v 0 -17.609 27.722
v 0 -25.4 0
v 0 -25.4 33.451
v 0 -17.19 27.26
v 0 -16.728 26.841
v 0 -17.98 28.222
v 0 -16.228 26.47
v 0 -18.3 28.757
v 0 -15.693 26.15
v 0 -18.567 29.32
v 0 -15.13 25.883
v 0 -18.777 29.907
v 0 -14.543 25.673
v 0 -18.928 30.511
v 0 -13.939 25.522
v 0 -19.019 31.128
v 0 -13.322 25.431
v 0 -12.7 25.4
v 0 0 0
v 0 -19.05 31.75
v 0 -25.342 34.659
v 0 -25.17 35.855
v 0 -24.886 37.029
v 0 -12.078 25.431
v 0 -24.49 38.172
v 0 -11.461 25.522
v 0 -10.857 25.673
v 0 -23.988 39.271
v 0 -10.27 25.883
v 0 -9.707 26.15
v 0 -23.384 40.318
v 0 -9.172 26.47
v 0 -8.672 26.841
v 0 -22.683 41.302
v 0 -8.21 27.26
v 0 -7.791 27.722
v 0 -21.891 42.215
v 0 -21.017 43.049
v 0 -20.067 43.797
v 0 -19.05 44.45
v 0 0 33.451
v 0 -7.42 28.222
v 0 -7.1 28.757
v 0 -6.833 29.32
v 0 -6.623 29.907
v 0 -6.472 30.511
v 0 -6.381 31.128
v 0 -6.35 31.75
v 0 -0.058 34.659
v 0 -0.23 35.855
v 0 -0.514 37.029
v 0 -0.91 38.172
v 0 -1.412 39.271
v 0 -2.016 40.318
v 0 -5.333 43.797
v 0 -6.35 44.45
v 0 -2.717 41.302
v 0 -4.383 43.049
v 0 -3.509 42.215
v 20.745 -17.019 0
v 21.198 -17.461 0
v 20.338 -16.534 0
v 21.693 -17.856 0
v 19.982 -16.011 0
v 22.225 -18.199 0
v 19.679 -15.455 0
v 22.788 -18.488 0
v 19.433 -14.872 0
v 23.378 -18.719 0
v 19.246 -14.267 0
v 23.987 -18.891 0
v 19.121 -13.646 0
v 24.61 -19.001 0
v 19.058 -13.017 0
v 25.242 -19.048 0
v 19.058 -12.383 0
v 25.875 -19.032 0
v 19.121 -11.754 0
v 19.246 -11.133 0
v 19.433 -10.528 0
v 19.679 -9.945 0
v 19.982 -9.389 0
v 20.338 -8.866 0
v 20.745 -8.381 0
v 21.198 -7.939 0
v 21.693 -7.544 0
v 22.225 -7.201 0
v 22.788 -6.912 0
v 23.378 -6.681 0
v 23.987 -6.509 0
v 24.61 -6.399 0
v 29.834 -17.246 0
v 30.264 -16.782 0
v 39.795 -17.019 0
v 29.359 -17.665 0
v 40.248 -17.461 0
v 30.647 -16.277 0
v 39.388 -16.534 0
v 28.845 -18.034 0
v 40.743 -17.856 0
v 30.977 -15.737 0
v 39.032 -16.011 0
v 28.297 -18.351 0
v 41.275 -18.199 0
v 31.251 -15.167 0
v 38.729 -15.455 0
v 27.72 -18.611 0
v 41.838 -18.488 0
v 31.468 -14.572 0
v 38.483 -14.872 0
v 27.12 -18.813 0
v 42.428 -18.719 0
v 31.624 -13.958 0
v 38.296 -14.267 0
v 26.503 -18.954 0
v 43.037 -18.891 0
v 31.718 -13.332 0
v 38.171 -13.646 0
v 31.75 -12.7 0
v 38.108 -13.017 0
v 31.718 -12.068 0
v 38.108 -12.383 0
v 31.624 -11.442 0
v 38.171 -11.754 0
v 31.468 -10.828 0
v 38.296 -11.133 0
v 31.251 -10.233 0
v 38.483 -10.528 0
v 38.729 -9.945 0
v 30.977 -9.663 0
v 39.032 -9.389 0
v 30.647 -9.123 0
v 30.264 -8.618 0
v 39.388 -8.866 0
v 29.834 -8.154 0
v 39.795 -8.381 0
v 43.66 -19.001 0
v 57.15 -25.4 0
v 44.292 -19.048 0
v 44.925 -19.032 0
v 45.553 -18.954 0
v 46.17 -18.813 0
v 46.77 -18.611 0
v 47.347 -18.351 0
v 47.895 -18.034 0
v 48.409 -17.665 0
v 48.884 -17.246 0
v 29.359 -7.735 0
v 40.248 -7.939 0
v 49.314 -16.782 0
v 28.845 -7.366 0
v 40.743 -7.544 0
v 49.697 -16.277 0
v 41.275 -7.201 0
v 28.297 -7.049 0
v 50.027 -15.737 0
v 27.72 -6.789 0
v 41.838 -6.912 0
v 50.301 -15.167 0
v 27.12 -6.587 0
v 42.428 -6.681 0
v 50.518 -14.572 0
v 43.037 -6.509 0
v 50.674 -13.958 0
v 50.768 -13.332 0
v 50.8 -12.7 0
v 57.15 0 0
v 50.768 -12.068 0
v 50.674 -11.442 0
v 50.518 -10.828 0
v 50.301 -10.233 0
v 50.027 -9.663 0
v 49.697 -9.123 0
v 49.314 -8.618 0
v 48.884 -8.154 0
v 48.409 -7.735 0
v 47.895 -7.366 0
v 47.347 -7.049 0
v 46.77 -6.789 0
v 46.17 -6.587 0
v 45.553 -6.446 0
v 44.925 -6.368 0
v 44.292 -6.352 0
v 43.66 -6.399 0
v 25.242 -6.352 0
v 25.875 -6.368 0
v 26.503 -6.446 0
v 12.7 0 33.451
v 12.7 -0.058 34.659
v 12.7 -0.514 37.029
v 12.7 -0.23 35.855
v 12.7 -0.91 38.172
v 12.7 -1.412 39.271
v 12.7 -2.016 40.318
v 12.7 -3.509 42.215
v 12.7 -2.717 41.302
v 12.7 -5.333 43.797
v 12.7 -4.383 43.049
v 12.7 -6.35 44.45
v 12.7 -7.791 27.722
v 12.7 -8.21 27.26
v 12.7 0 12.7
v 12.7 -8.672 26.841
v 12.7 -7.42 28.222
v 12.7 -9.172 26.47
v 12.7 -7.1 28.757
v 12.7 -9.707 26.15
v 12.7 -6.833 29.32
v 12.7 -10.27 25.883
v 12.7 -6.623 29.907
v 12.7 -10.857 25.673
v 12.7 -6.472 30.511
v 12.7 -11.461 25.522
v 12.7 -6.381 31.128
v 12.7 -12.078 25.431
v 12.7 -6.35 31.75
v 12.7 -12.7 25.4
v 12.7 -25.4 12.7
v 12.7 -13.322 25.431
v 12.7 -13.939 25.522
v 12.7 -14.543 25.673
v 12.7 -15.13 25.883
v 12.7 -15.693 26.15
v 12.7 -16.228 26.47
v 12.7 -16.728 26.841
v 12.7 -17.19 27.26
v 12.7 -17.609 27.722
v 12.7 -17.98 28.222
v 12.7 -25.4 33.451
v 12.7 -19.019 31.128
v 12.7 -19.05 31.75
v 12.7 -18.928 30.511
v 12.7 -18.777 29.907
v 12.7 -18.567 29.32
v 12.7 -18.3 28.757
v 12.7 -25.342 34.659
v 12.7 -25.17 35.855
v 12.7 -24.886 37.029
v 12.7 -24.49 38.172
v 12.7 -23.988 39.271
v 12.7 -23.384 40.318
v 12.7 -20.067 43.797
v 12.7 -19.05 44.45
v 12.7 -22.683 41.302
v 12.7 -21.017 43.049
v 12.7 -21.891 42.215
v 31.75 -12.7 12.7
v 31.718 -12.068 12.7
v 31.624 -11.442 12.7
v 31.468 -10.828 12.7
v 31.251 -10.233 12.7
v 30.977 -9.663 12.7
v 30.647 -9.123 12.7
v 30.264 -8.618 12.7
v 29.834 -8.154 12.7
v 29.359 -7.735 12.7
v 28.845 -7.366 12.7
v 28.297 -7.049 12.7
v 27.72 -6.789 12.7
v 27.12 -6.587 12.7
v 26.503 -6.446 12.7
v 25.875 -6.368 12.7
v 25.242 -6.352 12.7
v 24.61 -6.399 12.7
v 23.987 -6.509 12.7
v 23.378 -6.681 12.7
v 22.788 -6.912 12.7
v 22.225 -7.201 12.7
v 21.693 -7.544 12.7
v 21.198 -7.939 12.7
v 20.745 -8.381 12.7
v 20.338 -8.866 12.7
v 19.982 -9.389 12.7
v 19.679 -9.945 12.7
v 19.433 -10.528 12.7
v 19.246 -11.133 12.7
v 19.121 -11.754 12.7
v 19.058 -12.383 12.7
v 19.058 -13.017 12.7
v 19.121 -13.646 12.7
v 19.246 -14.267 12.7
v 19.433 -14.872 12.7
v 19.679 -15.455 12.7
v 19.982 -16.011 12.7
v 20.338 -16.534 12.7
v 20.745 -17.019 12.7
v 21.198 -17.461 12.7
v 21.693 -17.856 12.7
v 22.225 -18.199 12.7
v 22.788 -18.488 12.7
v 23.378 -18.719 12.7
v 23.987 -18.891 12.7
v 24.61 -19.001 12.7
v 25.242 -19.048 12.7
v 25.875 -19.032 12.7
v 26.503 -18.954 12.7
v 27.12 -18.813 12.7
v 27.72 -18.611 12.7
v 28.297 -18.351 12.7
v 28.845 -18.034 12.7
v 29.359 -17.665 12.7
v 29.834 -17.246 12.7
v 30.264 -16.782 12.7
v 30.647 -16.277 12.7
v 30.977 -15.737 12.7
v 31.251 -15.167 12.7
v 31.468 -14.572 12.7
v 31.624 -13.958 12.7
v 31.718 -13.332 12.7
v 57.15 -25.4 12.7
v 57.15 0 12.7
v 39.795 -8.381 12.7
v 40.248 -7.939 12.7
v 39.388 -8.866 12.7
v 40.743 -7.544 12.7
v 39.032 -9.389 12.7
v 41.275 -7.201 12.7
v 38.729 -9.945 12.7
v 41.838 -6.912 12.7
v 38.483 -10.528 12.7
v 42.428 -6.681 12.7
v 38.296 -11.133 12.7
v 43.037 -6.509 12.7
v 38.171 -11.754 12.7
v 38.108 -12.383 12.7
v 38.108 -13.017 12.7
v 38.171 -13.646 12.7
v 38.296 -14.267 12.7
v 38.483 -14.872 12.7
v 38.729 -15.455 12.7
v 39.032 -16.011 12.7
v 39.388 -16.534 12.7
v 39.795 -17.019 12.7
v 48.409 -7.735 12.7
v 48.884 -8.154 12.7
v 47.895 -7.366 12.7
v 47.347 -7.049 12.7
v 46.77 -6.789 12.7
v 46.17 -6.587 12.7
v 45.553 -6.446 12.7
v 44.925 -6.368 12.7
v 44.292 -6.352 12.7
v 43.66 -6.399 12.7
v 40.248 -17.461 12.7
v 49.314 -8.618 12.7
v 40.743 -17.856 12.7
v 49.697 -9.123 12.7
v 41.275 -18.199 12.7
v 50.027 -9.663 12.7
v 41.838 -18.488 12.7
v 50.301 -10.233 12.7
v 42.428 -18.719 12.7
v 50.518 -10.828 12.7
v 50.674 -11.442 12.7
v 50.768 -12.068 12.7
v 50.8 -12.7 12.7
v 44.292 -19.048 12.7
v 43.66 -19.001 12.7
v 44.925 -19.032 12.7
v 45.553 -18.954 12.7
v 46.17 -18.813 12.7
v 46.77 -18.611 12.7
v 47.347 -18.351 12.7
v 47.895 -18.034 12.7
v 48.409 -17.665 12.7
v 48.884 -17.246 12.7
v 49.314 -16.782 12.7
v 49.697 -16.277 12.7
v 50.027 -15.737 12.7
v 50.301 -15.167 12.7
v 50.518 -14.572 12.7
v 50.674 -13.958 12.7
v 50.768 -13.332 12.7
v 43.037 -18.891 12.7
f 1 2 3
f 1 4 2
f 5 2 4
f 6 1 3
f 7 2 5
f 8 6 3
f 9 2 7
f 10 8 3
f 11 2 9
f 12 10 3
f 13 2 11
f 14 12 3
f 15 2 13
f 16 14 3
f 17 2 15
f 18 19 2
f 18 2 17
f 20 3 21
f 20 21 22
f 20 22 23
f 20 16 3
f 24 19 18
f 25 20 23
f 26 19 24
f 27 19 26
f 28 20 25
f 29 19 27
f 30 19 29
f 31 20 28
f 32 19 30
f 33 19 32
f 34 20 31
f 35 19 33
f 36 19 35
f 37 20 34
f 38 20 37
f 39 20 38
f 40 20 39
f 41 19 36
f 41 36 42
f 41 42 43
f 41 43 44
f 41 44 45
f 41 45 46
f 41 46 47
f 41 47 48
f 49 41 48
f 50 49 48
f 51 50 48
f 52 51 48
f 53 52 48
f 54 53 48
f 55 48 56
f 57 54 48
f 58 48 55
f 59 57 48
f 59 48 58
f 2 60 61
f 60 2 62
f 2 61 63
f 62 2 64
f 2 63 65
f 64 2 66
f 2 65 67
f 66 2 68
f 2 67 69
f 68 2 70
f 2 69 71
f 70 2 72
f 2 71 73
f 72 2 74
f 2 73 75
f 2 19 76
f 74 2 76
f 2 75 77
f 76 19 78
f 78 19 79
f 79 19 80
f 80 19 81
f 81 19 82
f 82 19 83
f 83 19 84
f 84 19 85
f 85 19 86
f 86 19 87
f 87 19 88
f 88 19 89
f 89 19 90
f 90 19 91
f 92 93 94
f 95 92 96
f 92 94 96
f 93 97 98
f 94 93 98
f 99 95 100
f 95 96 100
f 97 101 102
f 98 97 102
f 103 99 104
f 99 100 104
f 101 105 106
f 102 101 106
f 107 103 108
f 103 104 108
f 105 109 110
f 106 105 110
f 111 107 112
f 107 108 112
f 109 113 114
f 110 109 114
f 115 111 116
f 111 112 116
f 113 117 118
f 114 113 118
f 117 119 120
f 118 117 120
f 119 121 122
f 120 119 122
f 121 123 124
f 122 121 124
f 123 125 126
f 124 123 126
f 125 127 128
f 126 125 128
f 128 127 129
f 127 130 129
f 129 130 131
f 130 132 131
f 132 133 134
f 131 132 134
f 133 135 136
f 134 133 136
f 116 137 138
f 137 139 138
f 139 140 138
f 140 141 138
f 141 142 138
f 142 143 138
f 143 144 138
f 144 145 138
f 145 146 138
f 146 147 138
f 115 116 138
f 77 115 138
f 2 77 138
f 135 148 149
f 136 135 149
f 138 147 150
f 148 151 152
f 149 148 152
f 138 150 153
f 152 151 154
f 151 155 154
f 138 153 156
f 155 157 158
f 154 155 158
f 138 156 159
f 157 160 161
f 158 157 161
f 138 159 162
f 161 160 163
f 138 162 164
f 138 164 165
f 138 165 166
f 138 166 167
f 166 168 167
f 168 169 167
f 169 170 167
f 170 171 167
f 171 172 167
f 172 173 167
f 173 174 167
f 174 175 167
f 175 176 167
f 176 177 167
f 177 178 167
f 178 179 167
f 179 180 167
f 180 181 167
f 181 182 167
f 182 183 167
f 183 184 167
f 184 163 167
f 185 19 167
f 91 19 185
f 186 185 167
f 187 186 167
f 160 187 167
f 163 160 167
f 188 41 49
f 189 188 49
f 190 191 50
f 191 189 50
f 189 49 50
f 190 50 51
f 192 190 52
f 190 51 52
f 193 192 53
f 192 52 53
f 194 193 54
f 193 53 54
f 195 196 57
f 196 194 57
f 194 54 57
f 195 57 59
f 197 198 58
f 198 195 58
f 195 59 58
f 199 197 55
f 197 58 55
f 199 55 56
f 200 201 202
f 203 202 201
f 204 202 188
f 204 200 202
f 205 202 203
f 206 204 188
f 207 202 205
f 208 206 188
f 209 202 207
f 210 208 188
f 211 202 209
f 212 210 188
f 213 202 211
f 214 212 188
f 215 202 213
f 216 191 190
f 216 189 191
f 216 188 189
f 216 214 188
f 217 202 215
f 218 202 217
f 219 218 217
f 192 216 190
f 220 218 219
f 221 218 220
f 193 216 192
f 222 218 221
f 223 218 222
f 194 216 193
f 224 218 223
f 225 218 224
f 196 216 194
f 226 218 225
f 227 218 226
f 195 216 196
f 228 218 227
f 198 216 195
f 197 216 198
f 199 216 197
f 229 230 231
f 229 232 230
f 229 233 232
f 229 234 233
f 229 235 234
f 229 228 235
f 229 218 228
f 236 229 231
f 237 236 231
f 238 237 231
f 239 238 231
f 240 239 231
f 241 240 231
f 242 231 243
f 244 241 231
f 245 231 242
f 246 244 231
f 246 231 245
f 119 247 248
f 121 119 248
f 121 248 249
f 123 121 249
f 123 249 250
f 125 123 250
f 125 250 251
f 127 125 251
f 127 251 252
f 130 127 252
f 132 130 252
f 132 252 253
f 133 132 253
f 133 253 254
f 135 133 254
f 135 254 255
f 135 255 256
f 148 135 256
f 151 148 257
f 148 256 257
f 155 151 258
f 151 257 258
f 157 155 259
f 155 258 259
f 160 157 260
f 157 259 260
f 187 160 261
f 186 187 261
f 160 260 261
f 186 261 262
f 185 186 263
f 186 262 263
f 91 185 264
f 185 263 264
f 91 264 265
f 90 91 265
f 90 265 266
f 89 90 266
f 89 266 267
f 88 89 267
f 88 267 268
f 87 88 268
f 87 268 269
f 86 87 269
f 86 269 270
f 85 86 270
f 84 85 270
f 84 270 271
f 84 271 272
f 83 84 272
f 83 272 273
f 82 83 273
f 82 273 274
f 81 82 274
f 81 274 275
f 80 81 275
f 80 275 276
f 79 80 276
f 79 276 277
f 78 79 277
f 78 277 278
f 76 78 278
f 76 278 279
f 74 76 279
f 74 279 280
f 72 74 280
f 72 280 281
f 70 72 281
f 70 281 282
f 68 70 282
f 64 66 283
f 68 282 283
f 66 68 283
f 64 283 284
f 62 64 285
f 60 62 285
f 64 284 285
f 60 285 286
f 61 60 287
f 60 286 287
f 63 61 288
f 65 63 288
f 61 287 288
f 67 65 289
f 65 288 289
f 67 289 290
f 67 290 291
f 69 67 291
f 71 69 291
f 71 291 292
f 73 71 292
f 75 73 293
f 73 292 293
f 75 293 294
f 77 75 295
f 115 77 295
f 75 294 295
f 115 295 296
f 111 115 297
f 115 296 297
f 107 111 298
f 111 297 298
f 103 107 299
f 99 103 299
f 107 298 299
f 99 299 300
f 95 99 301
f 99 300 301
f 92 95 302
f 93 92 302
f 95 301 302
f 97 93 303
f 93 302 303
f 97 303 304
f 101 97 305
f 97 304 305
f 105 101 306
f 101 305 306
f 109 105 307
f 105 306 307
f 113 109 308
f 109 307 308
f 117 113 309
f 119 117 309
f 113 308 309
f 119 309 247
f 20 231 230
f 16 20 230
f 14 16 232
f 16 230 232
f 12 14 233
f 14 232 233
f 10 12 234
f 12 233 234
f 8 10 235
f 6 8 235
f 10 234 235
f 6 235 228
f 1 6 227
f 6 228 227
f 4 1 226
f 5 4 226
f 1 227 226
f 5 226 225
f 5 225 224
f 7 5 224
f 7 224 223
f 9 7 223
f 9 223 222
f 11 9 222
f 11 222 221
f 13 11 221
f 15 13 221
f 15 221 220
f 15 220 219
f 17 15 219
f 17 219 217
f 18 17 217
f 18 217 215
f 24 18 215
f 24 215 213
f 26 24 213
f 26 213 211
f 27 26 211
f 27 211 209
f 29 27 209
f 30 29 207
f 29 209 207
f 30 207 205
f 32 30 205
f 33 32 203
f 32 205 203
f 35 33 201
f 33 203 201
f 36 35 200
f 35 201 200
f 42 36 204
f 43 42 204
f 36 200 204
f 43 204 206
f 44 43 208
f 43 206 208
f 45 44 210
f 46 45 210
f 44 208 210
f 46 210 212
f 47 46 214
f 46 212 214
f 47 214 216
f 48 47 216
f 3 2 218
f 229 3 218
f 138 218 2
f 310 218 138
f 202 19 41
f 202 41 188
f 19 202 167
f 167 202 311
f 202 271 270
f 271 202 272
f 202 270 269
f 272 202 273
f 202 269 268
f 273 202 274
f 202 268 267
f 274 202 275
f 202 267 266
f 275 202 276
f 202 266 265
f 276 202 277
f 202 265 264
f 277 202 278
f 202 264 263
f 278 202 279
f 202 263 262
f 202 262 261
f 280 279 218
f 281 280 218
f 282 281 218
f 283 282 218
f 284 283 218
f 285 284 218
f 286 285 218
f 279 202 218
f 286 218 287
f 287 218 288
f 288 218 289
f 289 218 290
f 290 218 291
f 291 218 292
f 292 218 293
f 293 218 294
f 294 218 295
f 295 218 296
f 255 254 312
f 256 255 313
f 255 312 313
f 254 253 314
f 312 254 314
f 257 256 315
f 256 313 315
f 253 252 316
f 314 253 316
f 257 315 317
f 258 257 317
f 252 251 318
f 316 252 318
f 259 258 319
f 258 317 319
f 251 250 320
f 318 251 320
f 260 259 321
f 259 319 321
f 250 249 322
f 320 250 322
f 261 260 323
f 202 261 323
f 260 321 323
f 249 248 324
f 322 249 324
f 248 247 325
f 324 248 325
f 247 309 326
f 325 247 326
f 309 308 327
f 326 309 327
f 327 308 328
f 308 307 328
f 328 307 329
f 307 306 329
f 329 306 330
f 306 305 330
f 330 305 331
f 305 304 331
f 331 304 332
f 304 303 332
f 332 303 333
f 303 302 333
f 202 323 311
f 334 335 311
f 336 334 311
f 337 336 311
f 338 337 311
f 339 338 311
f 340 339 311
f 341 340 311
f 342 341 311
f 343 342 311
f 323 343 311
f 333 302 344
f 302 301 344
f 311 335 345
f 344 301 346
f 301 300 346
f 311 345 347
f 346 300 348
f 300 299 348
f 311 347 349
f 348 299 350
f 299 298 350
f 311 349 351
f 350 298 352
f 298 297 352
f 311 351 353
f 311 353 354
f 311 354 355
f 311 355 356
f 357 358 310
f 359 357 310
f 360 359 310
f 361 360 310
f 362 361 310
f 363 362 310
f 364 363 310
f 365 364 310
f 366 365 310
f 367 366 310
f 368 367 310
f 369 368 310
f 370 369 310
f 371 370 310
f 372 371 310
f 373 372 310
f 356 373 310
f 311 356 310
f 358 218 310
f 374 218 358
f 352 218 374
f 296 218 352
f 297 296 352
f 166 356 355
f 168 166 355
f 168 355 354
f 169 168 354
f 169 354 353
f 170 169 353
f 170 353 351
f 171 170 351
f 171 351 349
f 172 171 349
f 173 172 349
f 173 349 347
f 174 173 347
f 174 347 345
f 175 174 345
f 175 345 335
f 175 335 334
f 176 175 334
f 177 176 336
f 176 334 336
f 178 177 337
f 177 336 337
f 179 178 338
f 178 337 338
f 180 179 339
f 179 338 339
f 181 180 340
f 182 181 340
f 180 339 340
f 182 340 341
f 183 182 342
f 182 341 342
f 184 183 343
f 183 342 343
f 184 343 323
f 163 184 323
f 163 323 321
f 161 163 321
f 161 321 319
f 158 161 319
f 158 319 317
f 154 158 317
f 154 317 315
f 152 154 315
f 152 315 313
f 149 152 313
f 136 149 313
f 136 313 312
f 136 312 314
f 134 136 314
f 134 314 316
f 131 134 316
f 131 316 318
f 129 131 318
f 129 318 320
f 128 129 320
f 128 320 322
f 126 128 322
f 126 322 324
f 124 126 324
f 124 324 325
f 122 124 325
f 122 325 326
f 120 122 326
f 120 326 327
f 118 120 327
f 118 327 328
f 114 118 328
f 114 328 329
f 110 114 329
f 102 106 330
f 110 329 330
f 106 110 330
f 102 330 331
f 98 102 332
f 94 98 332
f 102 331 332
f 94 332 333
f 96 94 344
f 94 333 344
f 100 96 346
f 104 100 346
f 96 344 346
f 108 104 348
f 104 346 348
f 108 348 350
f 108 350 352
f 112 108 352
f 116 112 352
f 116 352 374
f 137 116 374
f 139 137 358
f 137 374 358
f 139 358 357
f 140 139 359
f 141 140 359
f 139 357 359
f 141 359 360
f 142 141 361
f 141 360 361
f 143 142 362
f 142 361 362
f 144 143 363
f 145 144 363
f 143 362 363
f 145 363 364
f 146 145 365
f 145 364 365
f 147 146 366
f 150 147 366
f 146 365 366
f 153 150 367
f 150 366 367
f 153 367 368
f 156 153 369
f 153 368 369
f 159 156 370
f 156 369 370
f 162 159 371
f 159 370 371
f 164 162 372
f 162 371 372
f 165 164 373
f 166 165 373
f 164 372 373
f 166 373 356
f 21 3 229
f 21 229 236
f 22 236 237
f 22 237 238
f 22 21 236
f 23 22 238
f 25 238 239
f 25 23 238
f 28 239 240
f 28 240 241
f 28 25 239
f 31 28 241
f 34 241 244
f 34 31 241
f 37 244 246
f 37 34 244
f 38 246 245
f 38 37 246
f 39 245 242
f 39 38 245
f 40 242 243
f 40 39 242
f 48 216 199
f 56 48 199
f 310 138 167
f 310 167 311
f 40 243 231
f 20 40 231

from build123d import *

# Parameters (mm, degrees)
F0_W        = 57.15
F0_H        = 44.45
F1_DEPTH    = 25.4
F2_W        = 44.45
F2_H        = 31.75
F3_DEPTH    = 25.4
F4_R        = 6.35
F5_DEPTH    = 25.4
F7_DEPTH    = 25.4
F8_T1_DEPTH = 67.6926131403


# Not quite as in the source:
# - a fillet or chamfer that OpenCascade refuses, or shapes differently, is made with other operations: its cross-section is extruded or revolved along the edge and cut away or added


with BuildPart() as f1:
    # F0 (on Front) → F1 (new body)
    with BuildSketch(Plane.XZ):
        with Locations((28.575, 22.225)):
            Rectangle(F0_W, F0_H)
    extrude(amount=F1_DEPTH)

    # F2 (on face) → F3 (cut)
    with BuildSketch(Plane.XZ.offset(25.4)):
        with Locations((34.925, 28.575)):
            Rectangle(F2_W, F2_H)
    extrude(amount=-F3_DEPTH, mode=Mode.SUBTRACT)

    # F4 (on face) → F5 (cut)
    with BuildSketch(Plane.XY.offset(12.7)):
        with Locations((25.4, -12.7)):
            Circle(F4_R)
        with Locations((44.45, -12.7)):
            Circle(F4_R)
    extrude(amount=-F5_DEPTH, mode=Mode.SUBTRACT)

    # F6 (on face) → F7 (cut)
    with BuildSketch(Plane.YZ.offset(12.7)):
        with BuildLine():
            ThreePointArc((-19.05, 31.75), (-12.7, 38.1), (-6.35, 31.75))
            Line((-6.35, 31.75), (-6.35, 44.45))
            Line((-6.35, 44.45), (-19.05, 44.45))
            Line((-19.05, 44.45), (-19.05, 31.75))
        make_face()
        with BuildLine():
            ThreePointArc((-19.05, 31.75), (-12.7, 25.4), (-6.35, 31.75))
            ThreePointArc((-6.35, 31.75), (-12.7, 38.1), (-19.05, 31.75))
        make_face()
    extrude(amount=-F7_DEPTH, mode=Mode.SUBTRACT)

    # F8: fillet of radius 12.7 on 2 edges, made by hand

    # F8_s2 → F8_t1 (cut)
    with BuildSketch(Plane.YZ.offset(-27.4963065702)):
        with BuildLine():
            ThreePointArc((-25.4, 33.4514773719), (-23.6985226281, 39.8014773719), (-19.05, 44.45))
            Line((-19.05, 44.45), (-25.4, 44.45))
            Line((-25.4, 44.45), (-25.4, 33.4514773719))
        make_face()
        with BuildLine():
            ThreePointArc((0, 33.4514773719), (-1.7014773719, 39.8014773719), (-6.35, 44.45))
            Line((-6.35, 44.45), (0, 44.45))
            Line((0, 44.45), (0, 33.4514773719))
        make_face()
    extrude(amount=F8_T1_DEPTH, mode=Mode.SUBTRACT)


solid = f1.part
